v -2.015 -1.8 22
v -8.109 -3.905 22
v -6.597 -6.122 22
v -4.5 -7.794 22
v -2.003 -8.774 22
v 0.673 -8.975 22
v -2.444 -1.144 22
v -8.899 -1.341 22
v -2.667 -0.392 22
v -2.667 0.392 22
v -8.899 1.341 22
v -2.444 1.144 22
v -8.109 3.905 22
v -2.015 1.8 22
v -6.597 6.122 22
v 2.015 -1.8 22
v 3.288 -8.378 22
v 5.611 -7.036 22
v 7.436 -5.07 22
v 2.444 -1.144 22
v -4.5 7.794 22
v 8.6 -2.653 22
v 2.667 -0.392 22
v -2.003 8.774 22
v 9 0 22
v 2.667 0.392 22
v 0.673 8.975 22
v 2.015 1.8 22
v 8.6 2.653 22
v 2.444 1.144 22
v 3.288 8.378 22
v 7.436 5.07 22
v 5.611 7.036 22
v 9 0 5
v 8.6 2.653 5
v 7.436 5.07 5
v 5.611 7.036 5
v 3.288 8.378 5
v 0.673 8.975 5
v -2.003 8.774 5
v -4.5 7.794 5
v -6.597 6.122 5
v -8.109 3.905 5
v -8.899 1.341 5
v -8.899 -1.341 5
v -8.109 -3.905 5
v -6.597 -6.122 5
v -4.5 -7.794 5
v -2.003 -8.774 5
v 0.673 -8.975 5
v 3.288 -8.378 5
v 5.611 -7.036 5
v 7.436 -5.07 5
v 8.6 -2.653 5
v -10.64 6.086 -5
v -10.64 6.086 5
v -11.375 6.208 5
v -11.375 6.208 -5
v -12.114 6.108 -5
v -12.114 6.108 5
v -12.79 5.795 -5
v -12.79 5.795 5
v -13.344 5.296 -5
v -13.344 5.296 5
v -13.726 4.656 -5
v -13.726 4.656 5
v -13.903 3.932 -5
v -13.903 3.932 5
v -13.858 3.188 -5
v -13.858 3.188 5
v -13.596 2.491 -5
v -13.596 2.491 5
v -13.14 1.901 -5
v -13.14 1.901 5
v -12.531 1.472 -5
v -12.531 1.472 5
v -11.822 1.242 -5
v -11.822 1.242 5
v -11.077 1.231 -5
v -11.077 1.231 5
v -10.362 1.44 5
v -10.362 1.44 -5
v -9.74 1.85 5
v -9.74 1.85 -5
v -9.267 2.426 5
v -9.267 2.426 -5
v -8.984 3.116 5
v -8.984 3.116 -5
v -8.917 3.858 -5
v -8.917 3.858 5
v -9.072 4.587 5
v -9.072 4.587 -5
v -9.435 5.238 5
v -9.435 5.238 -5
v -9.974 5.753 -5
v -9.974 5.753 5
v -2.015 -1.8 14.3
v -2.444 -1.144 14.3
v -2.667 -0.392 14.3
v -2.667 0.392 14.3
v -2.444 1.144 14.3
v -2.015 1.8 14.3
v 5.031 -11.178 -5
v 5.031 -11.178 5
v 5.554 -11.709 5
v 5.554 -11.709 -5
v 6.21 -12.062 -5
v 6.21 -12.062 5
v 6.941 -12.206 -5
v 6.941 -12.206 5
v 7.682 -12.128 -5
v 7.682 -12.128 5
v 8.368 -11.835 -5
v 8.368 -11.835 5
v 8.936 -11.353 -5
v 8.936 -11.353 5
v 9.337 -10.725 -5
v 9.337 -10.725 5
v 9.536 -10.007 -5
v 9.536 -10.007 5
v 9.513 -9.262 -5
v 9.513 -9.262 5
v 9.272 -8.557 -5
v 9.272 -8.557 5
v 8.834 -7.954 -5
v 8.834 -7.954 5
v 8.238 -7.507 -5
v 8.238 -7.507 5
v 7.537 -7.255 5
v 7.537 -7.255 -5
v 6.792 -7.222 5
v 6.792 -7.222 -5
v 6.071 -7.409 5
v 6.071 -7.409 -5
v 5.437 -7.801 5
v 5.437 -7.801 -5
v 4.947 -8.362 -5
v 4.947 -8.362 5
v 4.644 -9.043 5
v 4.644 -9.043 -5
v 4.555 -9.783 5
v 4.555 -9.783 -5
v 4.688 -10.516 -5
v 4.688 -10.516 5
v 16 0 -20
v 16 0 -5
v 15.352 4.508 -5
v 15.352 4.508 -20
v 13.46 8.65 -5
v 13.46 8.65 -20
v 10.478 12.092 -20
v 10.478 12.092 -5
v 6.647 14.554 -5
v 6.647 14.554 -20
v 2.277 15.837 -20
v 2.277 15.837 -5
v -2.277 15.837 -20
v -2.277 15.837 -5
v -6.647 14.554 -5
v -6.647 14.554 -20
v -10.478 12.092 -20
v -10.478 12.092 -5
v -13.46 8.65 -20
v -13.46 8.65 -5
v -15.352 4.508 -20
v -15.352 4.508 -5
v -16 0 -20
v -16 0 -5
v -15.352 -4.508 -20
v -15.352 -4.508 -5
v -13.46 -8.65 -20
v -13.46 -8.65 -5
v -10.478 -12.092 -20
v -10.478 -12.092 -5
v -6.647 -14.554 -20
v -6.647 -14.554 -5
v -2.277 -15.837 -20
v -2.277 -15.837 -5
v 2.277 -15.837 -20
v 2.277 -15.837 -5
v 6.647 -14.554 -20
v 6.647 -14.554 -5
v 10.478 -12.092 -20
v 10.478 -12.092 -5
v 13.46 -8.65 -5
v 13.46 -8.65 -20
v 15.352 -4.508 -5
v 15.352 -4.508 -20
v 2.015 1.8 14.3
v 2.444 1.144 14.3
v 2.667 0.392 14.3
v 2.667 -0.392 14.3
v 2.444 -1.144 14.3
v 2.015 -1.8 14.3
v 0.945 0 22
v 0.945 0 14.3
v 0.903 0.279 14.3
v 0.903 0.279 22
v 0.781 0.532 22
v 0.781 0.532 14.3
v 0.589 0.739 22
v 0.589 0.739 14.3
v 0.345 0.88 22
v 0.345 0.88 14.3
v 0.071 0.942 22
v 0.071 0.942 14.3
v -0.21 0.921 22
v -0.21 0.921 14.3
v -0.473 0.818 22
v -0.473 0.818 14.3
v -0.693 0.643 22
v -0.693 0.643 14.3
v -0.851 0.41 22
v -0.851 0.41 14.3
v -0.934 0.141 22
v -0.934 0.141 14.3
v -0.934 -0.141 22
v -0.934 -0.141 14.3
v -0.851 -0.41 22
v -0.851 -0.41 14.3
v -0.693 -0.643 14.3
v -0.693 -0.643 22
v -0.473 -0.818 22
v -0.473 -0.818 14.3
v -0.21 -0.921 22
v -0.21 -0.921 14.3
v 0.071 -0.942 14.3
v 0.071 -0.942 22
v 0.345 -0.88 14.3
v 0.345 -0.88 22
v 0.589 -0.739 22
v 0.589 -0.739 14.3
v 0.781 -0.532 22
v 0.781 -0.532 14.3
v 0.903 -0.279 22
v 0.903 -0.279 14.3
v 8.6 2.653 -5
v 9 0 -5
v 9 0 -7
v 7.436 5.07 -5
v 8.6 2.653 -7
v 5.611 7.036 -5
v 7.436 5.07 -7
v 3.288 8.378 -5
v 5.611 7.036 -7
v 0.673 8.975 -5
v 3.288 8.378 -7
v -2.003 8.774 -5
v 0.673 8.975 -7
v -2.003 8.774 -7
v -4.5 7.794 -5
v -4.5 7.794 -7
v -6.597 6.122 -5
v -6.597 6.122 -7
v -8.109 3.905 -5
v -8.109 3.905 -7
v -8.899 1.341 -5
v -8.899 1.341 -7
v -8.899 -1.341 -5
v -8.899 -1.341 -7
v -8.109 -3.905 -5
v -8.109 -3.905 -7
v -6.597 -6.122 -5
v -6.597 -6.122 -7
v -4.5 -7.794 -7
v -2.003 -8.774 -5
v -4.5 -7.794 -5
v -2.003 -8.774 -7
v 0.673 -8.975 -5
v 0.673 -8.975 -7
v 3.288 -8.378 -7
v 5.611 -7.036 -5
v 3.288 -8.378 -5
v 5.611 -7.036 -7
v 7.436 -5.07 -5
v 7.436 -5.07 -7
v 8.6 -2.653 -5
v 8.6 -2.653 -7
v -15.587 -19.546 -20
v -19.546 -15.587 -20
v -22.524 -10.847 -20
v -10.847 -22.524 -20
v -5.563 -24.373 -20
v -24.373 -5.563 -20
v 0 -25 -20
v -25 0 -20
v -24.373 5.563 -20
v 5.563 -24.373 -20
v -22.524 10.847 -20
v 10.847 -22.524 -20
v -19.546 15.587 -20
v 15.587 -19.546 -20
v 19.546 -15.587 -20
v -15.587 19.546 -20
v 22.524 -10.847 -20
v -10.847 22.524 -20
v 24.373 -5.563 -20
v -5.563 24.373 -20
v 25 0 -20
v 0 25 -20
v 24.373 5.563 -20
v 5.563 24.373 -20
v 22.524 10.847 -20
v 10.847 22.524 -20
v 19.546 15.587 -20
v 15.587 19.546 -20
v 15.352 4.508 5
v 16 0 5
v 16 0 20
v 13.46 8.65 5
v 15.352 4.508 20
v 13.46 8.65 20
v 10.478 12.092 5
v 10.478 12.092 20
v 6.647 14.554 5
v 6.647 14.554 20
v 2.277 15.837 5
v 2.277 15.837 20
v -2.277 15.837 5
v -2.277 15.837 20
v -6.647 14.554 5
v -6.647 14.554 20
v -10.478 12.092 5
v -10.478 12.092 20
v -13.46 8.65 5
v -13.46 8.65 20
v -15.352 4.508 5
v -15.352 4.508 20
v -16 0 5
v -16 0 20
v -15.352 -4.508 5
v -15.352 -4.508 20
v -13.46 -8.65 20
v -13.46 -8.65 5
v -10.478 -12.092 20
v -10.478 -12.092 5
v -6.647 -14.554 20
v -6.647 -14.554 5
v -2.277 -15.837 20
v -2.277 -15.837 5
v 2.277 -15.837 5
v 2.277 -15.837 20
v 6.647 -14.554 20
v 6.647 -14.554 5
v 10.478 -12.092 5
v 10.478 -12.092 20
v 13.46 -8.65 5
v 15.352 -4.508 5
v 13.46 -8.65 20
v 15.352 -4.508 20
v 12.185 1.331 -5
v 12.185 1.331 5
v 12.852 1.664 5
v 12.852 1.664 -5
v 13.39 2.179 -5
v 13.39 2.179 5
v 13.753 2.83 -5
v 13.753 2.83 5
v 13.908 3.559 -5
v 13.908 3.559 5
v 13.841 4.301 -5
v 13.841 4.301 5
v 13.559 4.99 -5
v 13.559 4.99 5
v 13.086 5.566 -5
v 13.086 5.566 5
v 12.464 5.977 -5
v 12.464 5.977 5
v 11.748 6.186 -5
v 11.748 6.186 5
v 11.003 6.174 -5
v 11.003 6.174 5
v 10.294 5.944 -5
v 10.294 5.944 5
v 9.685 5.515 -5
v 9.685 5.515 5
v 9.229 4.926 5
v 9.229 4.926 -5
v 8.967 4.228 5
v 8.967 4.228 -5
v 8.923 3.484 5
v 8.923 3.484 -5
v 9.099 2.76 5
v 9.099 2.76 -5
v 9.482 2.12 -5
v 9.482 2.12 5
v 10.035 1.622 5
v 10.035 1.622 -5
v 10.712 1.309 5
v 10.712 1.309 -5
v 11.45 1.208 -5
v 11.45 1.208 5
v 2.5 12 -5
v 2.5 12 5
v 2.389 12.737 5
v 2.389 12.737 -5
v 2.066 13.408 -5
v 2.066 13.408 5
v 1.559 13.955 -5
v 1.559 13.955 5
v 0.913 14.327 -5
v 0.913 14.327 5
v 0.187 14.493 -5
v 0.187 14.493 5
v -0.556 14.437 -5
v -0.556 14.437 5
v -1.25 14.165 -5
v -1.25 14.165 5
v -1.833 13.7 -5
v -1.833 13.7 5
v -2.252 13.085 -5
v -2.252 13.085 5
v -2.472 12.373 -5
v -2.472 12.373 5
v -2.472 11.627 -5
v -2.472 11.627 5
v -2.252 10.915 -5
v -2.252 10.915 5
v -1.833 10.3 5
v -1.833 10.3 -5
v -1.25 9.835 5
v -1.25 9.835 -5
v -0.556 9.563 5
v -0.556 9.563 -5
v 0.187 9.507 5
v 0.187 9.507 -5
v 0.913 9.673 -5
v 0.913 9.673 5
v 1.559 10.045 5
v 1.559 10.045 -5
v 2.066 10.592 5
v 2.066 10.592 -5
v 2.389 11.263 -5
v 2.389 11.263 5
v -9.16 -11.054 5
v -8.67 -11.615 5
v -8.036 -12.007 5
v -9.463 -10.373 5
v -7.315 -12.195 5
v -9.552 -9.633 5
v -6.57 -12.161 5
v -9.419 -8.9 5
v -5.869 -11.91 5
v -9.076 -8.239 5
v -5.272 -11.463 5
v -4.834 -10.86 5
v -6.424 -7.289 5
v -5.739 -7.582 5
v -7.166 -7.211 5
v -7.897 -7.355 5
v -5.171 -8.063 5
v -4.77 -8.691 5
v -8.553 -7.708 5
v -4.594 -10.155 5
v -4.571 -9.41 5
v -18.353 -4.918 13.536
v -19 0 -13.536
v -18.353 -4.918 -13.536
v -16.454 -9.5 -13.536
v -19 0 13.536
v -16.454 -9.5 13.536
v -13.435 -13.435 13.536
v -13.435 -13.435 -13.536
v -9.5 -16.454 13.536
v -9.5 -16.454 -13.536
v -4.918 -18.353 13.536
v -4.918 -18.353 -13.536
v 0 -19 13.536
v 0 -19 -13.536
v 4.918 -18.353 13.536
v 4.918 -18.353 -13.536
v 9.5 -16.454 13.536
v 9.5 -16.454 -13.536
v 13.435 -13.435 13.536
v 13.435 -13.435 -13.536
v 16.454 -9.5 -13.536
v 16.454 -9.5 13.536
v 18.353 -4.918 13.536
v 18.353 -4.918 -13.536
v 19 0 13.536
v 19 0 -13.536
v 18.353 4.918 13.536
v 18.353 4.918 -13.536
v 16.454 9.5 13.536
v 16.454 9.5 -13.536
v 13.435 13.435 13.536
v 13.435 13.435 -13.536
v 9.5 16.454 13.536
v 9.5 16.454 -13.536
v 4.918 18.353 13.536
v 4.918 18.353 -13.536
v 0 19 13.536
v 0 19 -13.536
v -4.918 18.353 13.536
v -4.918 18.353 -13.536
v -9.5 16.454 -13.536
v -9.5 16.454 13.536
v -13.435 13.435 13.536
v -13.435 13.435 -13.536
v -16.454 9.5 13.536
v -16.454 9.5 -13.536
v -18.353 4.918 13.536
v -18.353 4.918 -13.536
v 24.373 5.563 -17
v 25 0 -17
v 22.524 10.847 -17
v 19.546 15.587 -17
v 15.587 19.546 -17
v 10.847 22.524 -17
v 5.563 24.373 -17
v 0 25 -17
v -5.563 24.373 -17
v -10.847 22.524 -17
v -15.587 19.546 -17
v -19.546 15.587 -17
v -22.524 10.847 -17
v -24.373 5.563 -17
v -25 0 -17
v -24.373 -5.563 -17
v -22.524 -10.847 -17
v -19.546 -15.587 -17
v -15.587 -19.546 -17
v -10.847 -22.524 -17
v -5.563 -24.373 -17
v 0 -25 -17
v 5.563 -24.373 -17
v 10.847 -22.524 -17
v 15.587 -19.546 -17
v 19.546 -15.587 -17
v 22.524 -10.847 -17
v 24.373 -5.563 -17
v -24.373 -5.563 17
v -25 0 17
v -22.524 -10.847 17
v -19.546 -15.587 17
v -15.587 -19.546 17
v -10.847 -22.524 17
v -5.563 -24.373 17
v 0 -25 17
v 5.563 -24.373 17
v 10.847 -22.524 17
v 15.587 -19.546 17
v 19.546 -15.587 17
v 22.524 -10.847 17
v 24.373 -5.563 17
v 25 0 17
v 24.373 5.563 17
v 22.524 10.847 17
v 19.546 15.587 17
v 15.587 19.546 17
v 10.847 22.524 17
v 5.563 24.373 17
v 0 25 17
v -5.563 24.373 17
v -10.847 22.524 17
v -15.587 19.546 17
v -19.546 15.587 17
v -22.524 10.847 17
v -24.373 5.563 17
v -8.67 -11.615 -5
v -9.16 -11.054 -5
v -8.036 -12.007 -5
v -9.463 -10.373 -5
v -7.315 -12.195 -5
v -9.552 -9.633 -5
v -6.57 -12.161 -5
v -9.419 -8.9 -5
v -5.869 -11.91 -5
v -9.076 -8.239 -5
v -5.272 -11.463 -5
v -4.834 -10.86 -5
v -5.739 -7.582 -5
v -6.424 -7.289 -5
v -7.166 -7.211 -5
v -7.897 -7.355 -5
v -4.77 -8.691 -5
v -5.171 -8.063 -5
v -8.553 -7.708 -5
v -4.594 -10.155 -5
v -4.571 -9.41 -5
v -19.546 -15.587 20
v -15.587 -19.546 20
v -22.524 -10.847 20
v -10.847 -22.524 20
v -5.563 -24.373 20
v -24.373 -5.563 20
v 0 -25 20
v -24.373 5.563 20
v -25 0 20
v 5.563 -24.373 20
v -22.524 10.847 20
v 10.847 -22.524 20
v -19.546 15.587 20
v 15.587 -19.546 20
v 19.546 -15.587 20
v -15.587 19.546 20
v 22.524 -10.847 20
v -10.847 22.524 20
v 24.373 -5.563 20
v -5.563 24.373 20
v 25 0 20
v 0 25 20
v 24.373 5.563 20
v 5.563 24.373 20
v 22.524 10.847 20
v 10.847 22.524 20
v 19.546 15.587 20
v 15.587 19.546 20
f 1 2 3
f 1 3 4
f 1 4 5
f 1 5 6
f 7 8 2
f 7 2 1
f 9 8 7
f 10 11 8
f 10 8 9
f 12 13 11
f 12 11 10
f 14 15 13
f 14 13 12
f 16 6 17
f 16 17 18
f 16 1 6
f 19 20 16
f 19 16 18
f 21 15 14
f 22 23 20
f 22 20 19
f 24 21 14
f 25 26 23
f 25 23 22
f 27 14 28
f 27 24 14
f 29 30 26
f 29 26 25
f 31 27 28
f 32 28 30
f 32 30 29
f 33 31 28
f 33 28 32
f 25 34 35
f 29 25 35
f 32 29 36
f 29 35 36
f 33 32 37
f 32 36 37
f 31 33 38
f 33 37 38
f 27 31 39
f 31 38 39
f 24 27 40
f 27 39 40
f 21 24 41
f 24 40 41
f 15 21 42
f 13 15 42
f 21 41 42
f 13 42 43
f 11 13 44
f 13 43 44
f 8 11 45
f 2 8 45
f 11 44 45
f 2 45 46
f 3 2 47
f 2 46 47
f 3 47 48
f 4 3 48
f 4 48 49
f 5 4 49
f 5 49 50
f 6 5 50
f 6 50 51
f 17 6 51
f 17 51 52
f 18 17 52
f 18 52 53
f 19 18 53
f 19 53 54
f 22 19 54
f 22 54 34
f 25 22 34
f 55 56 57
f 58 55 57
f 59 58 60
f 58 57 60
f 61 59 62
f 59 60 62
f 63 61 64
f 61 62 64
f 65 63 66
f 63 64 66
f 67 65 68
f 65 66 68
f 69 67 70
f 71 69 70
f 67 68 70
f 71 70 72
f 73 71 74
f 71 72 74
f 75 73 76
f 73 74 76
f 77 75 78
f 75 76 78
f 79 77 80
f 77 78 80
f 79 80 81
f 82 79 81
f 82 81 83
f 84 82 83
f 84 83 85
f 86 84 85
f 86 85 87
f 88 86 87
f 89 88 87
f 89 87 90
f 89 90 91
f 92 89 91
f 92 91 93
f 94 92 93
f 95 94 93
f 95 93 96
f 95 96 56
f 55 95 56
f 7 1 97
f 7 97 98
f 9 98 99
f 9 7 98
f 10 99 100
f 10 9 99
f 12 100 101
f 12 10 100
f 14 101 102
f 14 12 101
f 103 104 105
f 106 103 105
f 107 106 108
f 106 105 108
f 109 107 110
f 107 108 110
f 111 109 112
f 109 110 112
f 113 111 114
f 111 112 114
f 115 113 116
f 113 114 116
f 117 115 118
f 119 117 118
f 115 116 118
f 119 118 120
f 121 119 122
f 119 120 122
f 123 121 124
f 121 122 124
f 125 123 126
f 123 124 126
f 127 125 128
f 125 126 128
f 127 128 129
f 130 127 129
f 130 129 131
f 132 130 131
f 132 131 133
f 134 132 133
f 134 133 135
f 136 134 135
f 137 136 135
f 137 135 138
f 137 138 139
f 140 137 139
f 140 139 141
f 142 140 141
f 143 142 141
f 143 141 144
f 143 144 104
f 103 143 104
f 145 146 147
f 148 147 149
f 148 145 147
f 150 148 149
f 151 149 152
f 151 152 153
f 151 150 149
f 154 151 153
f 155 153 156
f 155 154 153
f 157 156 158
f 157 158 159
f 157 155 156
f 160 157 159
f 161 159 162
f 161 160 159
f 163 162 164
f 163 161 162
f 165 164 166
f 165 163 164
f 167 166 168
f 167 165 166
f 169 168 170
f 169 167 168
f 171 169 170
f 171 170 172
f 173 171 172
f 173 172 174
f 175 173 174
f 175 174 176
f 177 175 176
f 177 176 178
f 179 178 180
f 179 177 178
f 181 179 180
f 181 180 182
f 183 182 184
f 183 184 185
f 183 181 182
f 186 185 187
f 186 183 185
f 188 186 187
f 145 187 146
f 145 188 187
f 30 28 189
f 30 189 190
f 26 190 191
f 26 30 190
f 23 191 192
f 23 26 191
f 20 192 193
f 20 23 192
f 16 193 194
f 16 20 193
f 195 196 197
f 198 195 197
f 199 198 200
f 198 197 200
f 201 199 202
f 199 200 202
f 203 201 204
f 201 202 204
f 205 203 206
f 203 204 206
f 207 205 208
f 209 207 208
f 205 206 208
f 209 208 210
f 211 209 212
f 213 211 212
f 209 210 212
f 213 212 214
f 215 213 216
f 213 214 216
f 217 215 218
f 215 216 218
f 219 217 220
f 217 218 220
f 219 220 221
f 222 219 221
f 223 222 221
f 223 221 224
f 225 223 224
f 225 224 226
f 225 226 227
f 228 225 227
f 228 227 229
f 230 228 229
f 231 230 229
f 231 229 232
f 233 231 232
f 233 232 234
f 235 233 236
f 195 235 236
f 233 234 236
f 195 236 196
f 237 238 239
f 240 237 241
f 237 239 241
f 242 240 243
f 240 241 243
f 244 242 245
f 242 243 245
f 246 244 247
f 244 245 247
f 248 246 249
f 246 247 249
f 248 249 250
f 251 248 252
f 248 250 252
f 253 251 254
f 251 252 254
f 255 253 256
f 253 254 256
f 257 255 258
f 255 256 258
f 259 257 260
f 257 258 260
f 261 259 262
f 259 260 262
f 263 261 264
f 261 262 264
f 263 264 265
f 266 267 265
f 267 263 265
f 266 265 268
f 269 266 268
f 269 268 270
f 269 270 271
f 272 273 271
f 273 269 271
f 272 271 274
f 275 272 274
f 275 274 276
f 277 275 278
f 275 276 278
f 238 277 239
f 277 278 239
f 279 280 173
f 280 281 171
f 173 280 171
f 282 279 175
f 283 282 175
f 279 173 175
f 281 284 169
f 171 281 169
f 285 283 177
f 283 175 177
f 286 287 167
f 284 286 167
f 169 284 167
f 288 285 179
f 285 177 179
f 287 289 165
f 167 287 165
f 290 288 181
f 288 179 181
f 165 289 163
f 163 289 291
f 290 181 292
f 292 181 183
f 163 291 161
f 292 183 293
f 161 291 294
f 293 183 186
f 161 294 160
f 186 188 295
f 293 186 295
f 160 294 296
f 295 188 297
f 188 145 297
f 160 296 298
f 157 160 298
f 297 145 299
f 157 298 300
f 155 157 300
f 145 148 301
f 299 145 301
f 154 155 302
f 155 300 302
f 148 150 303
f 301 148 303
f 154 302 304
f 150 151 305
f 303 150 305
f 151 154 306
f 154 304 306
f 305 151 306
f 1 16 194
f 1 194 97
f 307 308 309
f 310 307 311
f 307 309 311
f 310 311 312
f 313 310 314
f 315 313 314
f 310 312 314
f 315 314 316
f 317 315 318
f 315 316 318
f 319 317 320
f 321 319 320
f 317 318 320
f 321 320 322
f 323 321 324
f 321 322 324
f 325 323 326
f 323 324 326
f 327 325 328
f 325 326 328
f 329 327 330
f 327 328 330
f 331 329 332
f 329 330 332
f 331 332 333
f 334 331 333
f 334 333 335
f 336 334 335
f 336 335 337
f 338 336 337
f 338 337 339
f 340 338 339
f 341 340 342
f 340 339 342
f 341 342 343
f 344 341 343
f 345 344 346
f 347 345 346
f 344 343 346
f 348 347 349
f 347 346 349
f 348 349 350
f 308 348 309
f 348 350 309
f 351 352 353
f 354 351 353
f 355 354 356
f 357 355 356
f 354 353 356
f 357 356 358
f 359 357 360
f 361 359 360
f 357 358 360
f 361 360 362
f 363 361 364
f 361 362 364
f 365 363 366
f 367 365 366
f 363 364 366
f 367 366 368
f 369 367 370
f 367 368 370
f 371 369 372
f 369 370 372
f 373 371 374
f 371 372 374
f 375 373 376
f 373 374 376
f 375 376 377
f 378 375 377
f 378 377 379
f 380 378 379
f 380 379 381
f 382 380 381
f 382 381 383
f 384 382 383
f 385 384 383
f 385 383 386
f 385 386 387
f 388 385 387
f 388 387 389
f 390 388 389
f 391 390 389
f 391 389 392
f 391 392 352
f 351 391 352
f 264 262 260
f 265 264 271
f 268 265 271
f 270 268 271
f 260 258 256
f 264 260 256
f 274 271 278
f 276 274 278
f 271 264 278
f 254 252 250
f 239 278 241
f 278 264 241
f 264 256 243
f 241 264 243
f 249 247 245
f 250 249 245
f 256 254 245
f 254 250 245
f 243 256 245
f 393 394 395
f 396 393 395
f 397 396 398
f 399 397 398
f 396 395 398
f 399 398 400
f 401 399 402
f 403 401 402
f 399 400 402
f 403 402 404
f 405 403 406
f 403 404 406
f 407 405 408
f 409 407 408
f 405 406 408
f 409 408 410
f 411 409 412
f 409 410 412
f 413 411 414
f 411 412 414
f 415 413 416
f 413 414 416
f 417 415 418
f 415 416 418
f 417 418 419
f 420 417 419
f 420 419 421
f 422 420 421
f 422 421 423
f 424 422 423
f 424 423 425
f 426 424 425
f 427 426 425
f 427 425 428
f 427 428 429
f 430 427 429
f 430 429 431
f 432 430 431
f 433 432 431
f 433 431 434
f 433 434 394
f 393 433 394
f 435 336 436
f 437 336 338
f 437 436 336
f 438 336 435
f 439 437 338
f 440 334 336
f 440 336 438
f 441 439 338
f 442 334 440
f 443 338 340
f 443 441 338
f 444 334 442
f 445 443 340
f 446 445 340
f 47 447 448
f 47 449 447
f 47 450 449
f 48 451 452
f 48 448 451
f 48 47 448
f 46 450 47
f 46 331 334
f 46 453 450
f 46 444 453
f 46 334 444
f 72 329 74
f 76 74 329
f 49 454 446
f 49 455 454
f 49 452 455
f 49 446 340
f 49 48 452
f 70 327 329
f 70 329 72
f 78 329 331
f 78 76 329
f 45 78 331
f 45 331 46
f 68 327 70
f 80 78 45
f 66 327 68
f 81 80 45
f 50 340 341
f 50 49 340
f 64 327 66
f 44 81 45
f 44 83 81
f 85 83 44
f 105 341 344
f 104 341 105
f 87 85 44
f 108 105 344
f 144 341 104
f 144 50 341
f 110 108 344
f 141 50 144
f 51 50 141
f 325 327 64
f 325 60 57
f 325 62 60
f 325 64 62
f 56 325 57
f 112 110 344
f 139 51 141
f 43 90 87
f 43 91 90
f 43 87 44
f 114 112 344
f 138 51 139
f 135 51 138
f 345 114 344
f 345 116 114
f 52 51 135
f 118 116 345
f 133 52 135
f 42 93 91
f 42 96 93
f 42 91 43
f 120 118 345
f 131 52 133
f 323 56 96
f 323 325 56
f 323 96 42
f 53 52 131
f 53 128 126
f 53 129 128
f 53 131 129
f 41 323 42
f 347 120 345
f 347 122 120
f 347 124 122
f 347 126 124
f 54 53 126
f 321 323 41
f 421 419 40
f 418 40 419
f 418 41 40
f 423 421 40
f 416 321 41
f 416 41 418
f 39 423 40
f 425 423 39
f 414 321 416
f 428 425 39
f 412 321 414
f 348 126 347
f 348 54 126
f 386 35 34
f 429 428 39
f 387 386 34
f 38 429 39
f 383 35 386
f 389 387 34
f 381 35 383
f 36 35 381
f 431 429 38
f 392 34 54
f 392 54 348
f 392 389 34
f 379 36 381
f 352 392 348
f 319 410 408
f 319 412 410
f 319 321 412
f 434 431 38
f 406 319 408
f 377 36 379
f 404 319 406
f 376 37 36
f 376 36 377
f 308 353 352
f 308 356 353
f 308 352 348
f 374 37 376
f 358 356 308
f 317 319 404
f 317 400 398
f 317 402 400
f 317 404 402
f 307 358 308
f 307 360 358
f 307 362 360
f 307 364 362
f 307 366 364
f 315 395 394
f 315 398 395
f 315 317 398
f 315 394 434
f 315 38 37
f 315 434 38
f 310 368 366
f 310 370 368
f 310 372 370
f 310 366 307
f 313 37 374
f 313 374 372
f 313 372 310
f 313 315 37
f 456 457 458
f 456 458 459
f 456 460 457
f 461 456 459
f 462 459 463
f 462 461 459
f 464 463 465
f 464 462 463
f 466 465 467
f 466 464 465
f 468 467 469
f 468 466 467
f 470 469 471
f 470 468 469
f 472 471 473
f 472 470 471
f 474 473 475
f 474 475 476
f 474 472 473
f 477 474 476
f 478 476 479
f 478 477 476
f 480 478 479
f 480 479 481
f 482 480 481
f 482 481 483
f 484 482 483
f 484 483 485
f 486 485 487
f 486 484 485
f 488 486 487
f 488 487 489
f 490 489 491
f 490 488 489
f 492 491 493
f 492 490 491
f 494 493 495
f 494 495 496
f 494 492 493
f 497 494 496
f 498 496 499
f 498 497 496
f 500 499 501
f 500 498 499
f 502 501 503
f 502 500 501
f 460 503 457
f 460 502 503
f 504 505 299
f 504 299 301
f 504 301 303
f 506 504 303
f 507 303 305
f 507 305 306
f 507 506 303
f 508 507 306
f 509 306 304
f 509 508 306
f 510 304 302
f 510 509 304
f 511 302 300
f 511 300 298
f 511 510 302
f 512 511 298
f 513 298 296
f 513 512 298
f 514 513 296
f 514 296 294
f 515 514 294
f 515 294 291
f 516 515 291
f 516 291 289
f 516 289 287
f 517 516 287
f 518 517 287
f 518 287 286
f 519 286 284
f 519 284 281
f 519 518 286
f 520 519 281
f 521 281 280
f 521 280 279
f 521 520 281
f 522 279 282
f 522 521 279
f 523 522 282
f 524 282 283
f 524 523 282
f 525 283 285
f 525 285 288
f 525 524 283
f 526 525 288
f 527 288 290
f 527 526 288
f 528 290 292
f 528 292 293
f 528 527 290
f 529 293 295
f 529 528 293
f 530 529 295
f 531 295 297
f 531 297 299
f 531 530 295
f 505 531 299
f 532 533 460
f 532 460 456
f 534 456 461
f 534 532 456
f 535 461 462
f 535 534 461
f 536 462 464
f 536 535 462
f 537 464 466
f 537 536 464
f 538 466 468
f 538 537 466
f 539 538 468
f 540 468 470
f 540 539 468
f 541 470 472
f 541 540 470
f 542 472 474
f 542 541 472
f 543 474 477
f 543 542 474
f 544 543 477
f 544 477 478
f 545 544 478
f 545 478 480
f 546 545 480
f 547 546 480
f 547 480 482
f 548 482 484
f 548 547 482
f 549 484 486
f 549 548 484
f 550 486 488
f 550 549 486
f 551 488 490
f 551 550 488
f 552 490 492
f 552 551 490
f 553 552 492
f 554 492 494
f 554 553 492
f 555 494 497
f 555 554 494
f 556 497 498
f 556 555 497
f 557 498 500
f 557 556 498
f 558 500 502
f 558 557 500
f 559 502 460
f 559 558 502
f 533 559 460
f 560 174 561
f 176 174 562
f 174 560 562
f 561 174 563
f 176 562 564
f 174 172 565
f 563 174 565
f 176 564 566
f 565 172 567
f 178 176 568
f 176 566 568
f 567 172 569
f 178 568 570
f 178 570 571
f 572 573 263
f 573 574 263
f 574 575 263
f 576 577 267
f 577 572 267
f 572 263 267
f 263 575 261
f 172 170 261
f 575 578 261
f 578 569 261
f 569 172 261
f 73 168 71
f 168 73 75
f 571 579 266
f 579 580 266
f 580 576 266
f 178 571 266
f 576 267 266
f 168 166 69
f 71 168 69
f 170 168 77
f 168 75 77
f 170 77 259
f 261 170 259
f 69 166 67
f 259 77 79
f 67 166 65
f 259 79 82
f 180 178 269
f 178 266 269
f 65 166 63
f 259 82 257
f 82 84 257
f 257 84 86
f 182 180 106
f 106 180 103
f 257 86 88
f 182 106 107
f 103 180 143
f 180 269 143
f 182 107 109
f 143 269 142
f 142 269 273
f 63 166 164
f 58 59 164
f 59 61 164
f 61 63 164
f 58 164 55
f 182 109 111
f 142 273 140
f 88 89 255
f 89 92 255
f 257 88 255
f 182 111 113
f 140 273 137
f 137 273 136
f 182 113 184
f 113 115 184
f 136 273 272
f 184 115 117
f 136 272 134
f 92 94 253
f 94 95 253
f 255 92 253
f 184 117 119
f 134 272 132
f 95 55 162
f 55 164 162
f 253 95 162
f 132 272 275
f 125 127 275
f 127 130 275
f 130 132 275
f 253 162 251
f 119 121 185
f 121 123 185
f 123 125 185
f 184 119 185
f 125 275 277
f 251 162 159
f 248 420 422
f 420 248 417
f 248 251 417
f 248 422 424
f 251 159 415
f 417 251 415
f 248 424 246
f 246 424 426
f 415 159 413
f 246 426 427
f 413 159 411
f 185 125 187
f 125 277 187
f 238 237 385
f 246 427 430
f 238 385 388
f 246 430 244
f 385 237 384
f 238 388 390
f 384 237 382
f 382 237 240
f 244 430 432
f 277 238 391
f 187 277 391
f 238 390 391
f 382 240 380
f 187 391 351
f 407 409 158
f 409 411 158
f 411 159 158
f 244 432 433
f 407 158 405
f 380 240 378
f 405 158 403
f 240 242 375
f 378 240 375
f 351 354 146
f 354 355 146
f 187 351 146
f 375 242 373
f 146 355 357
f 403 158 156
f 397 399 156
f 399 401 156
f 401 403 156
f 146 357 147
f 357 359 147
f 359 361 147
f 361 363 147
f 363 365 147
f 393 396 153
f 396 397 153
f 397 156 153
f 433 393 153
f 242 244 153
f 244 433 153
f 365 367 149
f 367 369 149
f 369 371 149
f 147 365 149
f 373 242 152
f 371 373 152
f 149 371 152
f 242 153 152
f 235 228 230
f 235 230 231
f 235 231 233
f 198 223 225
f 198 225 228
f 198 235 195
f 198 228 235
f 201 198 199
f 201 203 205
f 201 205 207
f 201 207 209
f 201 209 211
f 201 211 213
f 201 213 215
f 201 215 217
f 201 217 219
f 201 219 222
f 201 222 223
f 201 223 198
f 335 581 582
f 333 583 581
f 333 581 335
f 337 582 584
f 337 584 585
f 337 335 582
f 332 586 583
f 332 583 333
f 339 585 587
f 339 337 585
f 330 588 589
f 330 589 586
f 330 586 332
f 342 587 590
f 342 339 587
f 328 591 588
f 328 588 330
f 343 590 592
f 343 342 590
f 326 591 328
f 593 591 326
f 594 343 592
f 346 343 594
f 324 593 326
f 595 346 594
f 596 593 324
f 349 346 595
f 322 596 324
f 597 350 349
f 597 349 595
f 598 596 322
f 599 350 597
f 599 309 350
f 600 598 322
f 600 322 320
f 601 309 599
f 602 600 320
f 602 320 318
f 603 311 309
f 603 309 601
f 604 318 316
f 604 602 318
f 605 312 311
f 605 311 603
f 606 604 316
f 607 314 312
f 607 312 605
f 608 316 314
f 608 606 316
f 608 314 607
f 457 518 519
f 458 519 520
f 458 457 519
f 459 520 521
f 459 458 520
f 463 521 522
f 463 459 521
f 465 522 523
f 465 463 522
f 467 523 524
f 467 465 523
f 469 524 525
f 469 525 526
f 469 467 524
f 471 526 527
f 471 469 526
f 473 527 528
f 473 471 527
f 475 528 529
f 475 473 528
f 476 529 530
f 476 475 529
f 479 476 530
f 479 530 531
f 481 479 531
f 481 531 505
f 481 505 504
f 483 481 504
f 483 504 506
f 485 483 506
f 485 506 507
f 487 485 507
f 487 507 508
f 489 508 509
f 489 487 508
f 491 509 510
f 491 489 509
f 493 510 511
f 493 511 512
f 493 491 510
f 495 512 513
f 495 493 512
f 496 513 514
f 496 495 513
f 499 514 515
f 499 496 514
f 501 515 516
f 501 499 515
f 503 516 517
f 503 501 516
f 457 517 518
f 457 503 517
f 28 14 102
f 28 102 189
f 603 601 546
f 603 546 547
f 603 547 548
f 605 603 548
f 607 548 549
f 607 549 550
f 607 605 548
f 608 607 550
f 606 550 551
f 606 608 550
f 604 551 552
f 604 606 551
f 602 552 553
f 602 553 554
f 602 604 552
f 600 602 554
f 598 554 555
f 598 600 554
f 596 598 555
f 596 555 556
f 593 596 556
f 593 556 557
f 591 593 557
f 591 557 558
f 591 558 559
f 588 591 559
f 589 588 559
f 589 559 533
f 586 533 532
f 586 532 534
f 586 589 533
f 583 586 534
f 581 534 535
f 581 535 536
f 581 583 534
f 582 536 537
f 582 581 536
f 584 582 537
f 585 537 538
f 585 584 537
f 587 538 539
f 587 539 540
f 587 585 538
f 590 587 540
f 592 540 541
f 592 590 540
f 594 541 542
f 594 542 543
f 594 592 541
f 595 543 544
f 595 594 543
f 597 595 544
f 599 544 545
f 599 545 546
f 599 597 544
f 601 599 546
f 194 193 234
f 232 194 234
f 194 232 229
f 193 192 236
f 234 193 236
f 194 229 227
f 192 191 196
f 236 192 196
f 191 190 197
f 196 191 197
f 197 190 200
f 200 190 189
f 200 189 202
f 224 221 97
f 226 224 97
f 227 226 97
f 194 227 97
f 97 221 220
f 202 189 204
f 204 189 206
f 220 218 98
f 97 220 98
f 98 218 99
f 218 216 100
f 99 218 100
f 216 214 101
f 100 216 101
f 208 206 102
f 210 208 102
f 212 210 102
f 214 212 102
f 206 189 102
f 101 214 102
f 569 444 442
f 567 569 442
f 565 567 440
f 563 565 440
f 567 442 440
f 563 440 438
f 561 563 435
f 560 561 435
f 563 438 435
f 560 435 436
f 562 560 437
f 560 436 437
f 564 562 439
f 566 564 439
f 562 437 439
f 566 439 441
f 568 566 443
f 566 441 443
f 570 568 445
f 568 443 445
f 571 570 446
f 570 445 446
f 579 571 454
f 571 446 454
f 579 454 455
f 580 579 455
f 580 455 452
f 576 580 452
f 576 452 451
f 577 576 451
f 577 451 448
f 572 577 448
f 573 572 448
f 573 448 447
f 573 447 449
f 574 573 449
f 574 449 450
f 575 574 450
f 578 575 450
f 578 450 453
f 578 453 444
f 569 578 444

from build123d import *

# Parameters (mm, degrees)
ESQUISSE1_R                  = 25
ESQUISSE1_R_2                = 8
BOSS_EXTRU_1_DEPTH           = 20
ESQUISSE2_R                  = 16
ENL_V_MAT_EXTRU_1_DEPTH      = 15
ESQUISSE3_R                  = 2.5
ENL_V_MAT_EXTRU_2_DEPTH      = 44.301270189
R_P_TITION_CIRCULAIRE1_COUNT = 5
BOSS_EXTRU_2_DEPTH           = 17
BOSS_EXTRU_2_DEPTH_BACK      = 12
ESQUISSE4_R                  = 9
ESQUISSE4_R_2                = 8
BOSS_EXTRU_7_START           = -29
ESQUISSE13_R                 = 8
BOSS_EXTRU_7_DEPTH           = 29
ENL_V_MAT_EXTRU_3_DEPTH      = 7.7
ESQUISSE12_R                 = 0.945
BOSS_EXTRU_6_DEPTH           = 7.7


with BuildPart() as part:
    # Esquisse1 → Boss.-Extru.1 (new, symmetric)
    with BuildSketch(Plane.XY):
        Circle(ESQUISSE1_R)
        Circle(ESQUISSE1_R_2, mode=Mode.SUBTRACT)
    extrude(amount=BOSS_EXTRU_1_DEPTH, both=True)

    # Esquisse2 → Enlèv. mat.-Extru.1 (cut)
    with BuildSketch(Plane.XY.offset(20)):
        Circle(ESQUISSE2_R)
    enl_v_mat_extru_1 = extrude(amount=-ENL_V_MAT_EXTRU_1_DEPTH, mode=Mode.SUBTRACT)

    # Symétrie1: Enlèv. mat.-Extru.1 across plane
    add(enl_v_mat_extru_1.mirror(Plane.XY), mode=Mode.SUBTRACT)

    # Esquisse3 → Enlèv. mat.-Extru.2 (cut, through all)
    with BuildSketch(Plane.XY.offset(5)):
        with Locations((0, 12)):
            Circle(ESQUISSE3_R)
    enl_v_mat_extru_2 = extrude(amount=-ENL_V_MAT_EXTRU_2_DEPTH, mode=Mode.SUBTRACT)

    # Répétition circulaire1: Enlèv. mat.-Extru.2 ×5 about axis
    r_p_tition_circulaire1_axis = Axis((0, 0, 0), (0, 0, 1))
    for i in range(1, R_P_TITION_CIRCULAIRE1_COUNT):
        add(enl_v_mat_extru_2.rotate(r_p_tition_circulaire1_axis, i * 360 / R_P_TITION_CIRCULAIRE1_COUNT), mode=Mode.SUBTRACT)

    # Esquisse4 → Boss.-Extru.2 (add, two sides: drawn at the far end of the back side and taken through both)
    with BuildSketch(Plane.XY.offset(5).offset(-BOSS_EXTRU_2_DEPTH_BACK)):
        Circle(ESQUISSE4_R)
        Circle(ESQUISSE4_R_2, mode=Mode.SUBTRACT)
    extrude(amount=BOSS_EXTRU_2_DEPTH + BOSS_EXTRU_2_DEPTH_BACK)

    # Esquisse5 → Enlèvement de matière-Révolution1 (revolve, cut)
    with BuildSketch(Plane(origin=(0, 0, 0), x_dir=(1, 0, 0), z_dir=(0, 1, 0))):
        Polygon((-25, 17), (-19, 13.535898385), (-19, -13.535898385), (-25, -17), align=None)
    revolve(axis=Axis((0, 0, -25.284593115), (0, 0, 1)), mode=Mode.SUBTRACT)

    # Esquisse13 → Boss.-Extru.7 (add)
    with BuildSketch(Plane.XY.offset(22).offset(BOSS_EXTRU_7_START)):
        Circle(ESQUISSE13_R)
    extrude(amount=BOSS_EXTRU_7_DEPTH)

    # Esquisse11 → Enlèv. mat.-Extru.3 (cut)
    with BuildSketch(Plane.XY.offset(22)):
        with BuildLine():
            Line((-2.015, 1.8), (2.015, 1.8))
            ThreePointArc((2.015, 1.8), (2.695784465, 0), (2.015, -1.8))
            Line((2.015, -1.8), (-2.015, -1.8))
            ThreePointArc((-2.015, -1.8), (-2.695784465, 0), (-2.015, 1.8))
        make_face()
    extrude(amount=-ENL_V_MAT_EXTRU_3_DEPTH, mode=Mode.SUBTRACT)

    # Esquisse12 → Boss.-Extru.6 (add)
    with BuildSketch(Plane.XY.offset(14.3)):
        Circle(ESQUISSE12_R)
    extrude(amount=BOSS_EXTRU_6_DEPTH)


solid = part.part
